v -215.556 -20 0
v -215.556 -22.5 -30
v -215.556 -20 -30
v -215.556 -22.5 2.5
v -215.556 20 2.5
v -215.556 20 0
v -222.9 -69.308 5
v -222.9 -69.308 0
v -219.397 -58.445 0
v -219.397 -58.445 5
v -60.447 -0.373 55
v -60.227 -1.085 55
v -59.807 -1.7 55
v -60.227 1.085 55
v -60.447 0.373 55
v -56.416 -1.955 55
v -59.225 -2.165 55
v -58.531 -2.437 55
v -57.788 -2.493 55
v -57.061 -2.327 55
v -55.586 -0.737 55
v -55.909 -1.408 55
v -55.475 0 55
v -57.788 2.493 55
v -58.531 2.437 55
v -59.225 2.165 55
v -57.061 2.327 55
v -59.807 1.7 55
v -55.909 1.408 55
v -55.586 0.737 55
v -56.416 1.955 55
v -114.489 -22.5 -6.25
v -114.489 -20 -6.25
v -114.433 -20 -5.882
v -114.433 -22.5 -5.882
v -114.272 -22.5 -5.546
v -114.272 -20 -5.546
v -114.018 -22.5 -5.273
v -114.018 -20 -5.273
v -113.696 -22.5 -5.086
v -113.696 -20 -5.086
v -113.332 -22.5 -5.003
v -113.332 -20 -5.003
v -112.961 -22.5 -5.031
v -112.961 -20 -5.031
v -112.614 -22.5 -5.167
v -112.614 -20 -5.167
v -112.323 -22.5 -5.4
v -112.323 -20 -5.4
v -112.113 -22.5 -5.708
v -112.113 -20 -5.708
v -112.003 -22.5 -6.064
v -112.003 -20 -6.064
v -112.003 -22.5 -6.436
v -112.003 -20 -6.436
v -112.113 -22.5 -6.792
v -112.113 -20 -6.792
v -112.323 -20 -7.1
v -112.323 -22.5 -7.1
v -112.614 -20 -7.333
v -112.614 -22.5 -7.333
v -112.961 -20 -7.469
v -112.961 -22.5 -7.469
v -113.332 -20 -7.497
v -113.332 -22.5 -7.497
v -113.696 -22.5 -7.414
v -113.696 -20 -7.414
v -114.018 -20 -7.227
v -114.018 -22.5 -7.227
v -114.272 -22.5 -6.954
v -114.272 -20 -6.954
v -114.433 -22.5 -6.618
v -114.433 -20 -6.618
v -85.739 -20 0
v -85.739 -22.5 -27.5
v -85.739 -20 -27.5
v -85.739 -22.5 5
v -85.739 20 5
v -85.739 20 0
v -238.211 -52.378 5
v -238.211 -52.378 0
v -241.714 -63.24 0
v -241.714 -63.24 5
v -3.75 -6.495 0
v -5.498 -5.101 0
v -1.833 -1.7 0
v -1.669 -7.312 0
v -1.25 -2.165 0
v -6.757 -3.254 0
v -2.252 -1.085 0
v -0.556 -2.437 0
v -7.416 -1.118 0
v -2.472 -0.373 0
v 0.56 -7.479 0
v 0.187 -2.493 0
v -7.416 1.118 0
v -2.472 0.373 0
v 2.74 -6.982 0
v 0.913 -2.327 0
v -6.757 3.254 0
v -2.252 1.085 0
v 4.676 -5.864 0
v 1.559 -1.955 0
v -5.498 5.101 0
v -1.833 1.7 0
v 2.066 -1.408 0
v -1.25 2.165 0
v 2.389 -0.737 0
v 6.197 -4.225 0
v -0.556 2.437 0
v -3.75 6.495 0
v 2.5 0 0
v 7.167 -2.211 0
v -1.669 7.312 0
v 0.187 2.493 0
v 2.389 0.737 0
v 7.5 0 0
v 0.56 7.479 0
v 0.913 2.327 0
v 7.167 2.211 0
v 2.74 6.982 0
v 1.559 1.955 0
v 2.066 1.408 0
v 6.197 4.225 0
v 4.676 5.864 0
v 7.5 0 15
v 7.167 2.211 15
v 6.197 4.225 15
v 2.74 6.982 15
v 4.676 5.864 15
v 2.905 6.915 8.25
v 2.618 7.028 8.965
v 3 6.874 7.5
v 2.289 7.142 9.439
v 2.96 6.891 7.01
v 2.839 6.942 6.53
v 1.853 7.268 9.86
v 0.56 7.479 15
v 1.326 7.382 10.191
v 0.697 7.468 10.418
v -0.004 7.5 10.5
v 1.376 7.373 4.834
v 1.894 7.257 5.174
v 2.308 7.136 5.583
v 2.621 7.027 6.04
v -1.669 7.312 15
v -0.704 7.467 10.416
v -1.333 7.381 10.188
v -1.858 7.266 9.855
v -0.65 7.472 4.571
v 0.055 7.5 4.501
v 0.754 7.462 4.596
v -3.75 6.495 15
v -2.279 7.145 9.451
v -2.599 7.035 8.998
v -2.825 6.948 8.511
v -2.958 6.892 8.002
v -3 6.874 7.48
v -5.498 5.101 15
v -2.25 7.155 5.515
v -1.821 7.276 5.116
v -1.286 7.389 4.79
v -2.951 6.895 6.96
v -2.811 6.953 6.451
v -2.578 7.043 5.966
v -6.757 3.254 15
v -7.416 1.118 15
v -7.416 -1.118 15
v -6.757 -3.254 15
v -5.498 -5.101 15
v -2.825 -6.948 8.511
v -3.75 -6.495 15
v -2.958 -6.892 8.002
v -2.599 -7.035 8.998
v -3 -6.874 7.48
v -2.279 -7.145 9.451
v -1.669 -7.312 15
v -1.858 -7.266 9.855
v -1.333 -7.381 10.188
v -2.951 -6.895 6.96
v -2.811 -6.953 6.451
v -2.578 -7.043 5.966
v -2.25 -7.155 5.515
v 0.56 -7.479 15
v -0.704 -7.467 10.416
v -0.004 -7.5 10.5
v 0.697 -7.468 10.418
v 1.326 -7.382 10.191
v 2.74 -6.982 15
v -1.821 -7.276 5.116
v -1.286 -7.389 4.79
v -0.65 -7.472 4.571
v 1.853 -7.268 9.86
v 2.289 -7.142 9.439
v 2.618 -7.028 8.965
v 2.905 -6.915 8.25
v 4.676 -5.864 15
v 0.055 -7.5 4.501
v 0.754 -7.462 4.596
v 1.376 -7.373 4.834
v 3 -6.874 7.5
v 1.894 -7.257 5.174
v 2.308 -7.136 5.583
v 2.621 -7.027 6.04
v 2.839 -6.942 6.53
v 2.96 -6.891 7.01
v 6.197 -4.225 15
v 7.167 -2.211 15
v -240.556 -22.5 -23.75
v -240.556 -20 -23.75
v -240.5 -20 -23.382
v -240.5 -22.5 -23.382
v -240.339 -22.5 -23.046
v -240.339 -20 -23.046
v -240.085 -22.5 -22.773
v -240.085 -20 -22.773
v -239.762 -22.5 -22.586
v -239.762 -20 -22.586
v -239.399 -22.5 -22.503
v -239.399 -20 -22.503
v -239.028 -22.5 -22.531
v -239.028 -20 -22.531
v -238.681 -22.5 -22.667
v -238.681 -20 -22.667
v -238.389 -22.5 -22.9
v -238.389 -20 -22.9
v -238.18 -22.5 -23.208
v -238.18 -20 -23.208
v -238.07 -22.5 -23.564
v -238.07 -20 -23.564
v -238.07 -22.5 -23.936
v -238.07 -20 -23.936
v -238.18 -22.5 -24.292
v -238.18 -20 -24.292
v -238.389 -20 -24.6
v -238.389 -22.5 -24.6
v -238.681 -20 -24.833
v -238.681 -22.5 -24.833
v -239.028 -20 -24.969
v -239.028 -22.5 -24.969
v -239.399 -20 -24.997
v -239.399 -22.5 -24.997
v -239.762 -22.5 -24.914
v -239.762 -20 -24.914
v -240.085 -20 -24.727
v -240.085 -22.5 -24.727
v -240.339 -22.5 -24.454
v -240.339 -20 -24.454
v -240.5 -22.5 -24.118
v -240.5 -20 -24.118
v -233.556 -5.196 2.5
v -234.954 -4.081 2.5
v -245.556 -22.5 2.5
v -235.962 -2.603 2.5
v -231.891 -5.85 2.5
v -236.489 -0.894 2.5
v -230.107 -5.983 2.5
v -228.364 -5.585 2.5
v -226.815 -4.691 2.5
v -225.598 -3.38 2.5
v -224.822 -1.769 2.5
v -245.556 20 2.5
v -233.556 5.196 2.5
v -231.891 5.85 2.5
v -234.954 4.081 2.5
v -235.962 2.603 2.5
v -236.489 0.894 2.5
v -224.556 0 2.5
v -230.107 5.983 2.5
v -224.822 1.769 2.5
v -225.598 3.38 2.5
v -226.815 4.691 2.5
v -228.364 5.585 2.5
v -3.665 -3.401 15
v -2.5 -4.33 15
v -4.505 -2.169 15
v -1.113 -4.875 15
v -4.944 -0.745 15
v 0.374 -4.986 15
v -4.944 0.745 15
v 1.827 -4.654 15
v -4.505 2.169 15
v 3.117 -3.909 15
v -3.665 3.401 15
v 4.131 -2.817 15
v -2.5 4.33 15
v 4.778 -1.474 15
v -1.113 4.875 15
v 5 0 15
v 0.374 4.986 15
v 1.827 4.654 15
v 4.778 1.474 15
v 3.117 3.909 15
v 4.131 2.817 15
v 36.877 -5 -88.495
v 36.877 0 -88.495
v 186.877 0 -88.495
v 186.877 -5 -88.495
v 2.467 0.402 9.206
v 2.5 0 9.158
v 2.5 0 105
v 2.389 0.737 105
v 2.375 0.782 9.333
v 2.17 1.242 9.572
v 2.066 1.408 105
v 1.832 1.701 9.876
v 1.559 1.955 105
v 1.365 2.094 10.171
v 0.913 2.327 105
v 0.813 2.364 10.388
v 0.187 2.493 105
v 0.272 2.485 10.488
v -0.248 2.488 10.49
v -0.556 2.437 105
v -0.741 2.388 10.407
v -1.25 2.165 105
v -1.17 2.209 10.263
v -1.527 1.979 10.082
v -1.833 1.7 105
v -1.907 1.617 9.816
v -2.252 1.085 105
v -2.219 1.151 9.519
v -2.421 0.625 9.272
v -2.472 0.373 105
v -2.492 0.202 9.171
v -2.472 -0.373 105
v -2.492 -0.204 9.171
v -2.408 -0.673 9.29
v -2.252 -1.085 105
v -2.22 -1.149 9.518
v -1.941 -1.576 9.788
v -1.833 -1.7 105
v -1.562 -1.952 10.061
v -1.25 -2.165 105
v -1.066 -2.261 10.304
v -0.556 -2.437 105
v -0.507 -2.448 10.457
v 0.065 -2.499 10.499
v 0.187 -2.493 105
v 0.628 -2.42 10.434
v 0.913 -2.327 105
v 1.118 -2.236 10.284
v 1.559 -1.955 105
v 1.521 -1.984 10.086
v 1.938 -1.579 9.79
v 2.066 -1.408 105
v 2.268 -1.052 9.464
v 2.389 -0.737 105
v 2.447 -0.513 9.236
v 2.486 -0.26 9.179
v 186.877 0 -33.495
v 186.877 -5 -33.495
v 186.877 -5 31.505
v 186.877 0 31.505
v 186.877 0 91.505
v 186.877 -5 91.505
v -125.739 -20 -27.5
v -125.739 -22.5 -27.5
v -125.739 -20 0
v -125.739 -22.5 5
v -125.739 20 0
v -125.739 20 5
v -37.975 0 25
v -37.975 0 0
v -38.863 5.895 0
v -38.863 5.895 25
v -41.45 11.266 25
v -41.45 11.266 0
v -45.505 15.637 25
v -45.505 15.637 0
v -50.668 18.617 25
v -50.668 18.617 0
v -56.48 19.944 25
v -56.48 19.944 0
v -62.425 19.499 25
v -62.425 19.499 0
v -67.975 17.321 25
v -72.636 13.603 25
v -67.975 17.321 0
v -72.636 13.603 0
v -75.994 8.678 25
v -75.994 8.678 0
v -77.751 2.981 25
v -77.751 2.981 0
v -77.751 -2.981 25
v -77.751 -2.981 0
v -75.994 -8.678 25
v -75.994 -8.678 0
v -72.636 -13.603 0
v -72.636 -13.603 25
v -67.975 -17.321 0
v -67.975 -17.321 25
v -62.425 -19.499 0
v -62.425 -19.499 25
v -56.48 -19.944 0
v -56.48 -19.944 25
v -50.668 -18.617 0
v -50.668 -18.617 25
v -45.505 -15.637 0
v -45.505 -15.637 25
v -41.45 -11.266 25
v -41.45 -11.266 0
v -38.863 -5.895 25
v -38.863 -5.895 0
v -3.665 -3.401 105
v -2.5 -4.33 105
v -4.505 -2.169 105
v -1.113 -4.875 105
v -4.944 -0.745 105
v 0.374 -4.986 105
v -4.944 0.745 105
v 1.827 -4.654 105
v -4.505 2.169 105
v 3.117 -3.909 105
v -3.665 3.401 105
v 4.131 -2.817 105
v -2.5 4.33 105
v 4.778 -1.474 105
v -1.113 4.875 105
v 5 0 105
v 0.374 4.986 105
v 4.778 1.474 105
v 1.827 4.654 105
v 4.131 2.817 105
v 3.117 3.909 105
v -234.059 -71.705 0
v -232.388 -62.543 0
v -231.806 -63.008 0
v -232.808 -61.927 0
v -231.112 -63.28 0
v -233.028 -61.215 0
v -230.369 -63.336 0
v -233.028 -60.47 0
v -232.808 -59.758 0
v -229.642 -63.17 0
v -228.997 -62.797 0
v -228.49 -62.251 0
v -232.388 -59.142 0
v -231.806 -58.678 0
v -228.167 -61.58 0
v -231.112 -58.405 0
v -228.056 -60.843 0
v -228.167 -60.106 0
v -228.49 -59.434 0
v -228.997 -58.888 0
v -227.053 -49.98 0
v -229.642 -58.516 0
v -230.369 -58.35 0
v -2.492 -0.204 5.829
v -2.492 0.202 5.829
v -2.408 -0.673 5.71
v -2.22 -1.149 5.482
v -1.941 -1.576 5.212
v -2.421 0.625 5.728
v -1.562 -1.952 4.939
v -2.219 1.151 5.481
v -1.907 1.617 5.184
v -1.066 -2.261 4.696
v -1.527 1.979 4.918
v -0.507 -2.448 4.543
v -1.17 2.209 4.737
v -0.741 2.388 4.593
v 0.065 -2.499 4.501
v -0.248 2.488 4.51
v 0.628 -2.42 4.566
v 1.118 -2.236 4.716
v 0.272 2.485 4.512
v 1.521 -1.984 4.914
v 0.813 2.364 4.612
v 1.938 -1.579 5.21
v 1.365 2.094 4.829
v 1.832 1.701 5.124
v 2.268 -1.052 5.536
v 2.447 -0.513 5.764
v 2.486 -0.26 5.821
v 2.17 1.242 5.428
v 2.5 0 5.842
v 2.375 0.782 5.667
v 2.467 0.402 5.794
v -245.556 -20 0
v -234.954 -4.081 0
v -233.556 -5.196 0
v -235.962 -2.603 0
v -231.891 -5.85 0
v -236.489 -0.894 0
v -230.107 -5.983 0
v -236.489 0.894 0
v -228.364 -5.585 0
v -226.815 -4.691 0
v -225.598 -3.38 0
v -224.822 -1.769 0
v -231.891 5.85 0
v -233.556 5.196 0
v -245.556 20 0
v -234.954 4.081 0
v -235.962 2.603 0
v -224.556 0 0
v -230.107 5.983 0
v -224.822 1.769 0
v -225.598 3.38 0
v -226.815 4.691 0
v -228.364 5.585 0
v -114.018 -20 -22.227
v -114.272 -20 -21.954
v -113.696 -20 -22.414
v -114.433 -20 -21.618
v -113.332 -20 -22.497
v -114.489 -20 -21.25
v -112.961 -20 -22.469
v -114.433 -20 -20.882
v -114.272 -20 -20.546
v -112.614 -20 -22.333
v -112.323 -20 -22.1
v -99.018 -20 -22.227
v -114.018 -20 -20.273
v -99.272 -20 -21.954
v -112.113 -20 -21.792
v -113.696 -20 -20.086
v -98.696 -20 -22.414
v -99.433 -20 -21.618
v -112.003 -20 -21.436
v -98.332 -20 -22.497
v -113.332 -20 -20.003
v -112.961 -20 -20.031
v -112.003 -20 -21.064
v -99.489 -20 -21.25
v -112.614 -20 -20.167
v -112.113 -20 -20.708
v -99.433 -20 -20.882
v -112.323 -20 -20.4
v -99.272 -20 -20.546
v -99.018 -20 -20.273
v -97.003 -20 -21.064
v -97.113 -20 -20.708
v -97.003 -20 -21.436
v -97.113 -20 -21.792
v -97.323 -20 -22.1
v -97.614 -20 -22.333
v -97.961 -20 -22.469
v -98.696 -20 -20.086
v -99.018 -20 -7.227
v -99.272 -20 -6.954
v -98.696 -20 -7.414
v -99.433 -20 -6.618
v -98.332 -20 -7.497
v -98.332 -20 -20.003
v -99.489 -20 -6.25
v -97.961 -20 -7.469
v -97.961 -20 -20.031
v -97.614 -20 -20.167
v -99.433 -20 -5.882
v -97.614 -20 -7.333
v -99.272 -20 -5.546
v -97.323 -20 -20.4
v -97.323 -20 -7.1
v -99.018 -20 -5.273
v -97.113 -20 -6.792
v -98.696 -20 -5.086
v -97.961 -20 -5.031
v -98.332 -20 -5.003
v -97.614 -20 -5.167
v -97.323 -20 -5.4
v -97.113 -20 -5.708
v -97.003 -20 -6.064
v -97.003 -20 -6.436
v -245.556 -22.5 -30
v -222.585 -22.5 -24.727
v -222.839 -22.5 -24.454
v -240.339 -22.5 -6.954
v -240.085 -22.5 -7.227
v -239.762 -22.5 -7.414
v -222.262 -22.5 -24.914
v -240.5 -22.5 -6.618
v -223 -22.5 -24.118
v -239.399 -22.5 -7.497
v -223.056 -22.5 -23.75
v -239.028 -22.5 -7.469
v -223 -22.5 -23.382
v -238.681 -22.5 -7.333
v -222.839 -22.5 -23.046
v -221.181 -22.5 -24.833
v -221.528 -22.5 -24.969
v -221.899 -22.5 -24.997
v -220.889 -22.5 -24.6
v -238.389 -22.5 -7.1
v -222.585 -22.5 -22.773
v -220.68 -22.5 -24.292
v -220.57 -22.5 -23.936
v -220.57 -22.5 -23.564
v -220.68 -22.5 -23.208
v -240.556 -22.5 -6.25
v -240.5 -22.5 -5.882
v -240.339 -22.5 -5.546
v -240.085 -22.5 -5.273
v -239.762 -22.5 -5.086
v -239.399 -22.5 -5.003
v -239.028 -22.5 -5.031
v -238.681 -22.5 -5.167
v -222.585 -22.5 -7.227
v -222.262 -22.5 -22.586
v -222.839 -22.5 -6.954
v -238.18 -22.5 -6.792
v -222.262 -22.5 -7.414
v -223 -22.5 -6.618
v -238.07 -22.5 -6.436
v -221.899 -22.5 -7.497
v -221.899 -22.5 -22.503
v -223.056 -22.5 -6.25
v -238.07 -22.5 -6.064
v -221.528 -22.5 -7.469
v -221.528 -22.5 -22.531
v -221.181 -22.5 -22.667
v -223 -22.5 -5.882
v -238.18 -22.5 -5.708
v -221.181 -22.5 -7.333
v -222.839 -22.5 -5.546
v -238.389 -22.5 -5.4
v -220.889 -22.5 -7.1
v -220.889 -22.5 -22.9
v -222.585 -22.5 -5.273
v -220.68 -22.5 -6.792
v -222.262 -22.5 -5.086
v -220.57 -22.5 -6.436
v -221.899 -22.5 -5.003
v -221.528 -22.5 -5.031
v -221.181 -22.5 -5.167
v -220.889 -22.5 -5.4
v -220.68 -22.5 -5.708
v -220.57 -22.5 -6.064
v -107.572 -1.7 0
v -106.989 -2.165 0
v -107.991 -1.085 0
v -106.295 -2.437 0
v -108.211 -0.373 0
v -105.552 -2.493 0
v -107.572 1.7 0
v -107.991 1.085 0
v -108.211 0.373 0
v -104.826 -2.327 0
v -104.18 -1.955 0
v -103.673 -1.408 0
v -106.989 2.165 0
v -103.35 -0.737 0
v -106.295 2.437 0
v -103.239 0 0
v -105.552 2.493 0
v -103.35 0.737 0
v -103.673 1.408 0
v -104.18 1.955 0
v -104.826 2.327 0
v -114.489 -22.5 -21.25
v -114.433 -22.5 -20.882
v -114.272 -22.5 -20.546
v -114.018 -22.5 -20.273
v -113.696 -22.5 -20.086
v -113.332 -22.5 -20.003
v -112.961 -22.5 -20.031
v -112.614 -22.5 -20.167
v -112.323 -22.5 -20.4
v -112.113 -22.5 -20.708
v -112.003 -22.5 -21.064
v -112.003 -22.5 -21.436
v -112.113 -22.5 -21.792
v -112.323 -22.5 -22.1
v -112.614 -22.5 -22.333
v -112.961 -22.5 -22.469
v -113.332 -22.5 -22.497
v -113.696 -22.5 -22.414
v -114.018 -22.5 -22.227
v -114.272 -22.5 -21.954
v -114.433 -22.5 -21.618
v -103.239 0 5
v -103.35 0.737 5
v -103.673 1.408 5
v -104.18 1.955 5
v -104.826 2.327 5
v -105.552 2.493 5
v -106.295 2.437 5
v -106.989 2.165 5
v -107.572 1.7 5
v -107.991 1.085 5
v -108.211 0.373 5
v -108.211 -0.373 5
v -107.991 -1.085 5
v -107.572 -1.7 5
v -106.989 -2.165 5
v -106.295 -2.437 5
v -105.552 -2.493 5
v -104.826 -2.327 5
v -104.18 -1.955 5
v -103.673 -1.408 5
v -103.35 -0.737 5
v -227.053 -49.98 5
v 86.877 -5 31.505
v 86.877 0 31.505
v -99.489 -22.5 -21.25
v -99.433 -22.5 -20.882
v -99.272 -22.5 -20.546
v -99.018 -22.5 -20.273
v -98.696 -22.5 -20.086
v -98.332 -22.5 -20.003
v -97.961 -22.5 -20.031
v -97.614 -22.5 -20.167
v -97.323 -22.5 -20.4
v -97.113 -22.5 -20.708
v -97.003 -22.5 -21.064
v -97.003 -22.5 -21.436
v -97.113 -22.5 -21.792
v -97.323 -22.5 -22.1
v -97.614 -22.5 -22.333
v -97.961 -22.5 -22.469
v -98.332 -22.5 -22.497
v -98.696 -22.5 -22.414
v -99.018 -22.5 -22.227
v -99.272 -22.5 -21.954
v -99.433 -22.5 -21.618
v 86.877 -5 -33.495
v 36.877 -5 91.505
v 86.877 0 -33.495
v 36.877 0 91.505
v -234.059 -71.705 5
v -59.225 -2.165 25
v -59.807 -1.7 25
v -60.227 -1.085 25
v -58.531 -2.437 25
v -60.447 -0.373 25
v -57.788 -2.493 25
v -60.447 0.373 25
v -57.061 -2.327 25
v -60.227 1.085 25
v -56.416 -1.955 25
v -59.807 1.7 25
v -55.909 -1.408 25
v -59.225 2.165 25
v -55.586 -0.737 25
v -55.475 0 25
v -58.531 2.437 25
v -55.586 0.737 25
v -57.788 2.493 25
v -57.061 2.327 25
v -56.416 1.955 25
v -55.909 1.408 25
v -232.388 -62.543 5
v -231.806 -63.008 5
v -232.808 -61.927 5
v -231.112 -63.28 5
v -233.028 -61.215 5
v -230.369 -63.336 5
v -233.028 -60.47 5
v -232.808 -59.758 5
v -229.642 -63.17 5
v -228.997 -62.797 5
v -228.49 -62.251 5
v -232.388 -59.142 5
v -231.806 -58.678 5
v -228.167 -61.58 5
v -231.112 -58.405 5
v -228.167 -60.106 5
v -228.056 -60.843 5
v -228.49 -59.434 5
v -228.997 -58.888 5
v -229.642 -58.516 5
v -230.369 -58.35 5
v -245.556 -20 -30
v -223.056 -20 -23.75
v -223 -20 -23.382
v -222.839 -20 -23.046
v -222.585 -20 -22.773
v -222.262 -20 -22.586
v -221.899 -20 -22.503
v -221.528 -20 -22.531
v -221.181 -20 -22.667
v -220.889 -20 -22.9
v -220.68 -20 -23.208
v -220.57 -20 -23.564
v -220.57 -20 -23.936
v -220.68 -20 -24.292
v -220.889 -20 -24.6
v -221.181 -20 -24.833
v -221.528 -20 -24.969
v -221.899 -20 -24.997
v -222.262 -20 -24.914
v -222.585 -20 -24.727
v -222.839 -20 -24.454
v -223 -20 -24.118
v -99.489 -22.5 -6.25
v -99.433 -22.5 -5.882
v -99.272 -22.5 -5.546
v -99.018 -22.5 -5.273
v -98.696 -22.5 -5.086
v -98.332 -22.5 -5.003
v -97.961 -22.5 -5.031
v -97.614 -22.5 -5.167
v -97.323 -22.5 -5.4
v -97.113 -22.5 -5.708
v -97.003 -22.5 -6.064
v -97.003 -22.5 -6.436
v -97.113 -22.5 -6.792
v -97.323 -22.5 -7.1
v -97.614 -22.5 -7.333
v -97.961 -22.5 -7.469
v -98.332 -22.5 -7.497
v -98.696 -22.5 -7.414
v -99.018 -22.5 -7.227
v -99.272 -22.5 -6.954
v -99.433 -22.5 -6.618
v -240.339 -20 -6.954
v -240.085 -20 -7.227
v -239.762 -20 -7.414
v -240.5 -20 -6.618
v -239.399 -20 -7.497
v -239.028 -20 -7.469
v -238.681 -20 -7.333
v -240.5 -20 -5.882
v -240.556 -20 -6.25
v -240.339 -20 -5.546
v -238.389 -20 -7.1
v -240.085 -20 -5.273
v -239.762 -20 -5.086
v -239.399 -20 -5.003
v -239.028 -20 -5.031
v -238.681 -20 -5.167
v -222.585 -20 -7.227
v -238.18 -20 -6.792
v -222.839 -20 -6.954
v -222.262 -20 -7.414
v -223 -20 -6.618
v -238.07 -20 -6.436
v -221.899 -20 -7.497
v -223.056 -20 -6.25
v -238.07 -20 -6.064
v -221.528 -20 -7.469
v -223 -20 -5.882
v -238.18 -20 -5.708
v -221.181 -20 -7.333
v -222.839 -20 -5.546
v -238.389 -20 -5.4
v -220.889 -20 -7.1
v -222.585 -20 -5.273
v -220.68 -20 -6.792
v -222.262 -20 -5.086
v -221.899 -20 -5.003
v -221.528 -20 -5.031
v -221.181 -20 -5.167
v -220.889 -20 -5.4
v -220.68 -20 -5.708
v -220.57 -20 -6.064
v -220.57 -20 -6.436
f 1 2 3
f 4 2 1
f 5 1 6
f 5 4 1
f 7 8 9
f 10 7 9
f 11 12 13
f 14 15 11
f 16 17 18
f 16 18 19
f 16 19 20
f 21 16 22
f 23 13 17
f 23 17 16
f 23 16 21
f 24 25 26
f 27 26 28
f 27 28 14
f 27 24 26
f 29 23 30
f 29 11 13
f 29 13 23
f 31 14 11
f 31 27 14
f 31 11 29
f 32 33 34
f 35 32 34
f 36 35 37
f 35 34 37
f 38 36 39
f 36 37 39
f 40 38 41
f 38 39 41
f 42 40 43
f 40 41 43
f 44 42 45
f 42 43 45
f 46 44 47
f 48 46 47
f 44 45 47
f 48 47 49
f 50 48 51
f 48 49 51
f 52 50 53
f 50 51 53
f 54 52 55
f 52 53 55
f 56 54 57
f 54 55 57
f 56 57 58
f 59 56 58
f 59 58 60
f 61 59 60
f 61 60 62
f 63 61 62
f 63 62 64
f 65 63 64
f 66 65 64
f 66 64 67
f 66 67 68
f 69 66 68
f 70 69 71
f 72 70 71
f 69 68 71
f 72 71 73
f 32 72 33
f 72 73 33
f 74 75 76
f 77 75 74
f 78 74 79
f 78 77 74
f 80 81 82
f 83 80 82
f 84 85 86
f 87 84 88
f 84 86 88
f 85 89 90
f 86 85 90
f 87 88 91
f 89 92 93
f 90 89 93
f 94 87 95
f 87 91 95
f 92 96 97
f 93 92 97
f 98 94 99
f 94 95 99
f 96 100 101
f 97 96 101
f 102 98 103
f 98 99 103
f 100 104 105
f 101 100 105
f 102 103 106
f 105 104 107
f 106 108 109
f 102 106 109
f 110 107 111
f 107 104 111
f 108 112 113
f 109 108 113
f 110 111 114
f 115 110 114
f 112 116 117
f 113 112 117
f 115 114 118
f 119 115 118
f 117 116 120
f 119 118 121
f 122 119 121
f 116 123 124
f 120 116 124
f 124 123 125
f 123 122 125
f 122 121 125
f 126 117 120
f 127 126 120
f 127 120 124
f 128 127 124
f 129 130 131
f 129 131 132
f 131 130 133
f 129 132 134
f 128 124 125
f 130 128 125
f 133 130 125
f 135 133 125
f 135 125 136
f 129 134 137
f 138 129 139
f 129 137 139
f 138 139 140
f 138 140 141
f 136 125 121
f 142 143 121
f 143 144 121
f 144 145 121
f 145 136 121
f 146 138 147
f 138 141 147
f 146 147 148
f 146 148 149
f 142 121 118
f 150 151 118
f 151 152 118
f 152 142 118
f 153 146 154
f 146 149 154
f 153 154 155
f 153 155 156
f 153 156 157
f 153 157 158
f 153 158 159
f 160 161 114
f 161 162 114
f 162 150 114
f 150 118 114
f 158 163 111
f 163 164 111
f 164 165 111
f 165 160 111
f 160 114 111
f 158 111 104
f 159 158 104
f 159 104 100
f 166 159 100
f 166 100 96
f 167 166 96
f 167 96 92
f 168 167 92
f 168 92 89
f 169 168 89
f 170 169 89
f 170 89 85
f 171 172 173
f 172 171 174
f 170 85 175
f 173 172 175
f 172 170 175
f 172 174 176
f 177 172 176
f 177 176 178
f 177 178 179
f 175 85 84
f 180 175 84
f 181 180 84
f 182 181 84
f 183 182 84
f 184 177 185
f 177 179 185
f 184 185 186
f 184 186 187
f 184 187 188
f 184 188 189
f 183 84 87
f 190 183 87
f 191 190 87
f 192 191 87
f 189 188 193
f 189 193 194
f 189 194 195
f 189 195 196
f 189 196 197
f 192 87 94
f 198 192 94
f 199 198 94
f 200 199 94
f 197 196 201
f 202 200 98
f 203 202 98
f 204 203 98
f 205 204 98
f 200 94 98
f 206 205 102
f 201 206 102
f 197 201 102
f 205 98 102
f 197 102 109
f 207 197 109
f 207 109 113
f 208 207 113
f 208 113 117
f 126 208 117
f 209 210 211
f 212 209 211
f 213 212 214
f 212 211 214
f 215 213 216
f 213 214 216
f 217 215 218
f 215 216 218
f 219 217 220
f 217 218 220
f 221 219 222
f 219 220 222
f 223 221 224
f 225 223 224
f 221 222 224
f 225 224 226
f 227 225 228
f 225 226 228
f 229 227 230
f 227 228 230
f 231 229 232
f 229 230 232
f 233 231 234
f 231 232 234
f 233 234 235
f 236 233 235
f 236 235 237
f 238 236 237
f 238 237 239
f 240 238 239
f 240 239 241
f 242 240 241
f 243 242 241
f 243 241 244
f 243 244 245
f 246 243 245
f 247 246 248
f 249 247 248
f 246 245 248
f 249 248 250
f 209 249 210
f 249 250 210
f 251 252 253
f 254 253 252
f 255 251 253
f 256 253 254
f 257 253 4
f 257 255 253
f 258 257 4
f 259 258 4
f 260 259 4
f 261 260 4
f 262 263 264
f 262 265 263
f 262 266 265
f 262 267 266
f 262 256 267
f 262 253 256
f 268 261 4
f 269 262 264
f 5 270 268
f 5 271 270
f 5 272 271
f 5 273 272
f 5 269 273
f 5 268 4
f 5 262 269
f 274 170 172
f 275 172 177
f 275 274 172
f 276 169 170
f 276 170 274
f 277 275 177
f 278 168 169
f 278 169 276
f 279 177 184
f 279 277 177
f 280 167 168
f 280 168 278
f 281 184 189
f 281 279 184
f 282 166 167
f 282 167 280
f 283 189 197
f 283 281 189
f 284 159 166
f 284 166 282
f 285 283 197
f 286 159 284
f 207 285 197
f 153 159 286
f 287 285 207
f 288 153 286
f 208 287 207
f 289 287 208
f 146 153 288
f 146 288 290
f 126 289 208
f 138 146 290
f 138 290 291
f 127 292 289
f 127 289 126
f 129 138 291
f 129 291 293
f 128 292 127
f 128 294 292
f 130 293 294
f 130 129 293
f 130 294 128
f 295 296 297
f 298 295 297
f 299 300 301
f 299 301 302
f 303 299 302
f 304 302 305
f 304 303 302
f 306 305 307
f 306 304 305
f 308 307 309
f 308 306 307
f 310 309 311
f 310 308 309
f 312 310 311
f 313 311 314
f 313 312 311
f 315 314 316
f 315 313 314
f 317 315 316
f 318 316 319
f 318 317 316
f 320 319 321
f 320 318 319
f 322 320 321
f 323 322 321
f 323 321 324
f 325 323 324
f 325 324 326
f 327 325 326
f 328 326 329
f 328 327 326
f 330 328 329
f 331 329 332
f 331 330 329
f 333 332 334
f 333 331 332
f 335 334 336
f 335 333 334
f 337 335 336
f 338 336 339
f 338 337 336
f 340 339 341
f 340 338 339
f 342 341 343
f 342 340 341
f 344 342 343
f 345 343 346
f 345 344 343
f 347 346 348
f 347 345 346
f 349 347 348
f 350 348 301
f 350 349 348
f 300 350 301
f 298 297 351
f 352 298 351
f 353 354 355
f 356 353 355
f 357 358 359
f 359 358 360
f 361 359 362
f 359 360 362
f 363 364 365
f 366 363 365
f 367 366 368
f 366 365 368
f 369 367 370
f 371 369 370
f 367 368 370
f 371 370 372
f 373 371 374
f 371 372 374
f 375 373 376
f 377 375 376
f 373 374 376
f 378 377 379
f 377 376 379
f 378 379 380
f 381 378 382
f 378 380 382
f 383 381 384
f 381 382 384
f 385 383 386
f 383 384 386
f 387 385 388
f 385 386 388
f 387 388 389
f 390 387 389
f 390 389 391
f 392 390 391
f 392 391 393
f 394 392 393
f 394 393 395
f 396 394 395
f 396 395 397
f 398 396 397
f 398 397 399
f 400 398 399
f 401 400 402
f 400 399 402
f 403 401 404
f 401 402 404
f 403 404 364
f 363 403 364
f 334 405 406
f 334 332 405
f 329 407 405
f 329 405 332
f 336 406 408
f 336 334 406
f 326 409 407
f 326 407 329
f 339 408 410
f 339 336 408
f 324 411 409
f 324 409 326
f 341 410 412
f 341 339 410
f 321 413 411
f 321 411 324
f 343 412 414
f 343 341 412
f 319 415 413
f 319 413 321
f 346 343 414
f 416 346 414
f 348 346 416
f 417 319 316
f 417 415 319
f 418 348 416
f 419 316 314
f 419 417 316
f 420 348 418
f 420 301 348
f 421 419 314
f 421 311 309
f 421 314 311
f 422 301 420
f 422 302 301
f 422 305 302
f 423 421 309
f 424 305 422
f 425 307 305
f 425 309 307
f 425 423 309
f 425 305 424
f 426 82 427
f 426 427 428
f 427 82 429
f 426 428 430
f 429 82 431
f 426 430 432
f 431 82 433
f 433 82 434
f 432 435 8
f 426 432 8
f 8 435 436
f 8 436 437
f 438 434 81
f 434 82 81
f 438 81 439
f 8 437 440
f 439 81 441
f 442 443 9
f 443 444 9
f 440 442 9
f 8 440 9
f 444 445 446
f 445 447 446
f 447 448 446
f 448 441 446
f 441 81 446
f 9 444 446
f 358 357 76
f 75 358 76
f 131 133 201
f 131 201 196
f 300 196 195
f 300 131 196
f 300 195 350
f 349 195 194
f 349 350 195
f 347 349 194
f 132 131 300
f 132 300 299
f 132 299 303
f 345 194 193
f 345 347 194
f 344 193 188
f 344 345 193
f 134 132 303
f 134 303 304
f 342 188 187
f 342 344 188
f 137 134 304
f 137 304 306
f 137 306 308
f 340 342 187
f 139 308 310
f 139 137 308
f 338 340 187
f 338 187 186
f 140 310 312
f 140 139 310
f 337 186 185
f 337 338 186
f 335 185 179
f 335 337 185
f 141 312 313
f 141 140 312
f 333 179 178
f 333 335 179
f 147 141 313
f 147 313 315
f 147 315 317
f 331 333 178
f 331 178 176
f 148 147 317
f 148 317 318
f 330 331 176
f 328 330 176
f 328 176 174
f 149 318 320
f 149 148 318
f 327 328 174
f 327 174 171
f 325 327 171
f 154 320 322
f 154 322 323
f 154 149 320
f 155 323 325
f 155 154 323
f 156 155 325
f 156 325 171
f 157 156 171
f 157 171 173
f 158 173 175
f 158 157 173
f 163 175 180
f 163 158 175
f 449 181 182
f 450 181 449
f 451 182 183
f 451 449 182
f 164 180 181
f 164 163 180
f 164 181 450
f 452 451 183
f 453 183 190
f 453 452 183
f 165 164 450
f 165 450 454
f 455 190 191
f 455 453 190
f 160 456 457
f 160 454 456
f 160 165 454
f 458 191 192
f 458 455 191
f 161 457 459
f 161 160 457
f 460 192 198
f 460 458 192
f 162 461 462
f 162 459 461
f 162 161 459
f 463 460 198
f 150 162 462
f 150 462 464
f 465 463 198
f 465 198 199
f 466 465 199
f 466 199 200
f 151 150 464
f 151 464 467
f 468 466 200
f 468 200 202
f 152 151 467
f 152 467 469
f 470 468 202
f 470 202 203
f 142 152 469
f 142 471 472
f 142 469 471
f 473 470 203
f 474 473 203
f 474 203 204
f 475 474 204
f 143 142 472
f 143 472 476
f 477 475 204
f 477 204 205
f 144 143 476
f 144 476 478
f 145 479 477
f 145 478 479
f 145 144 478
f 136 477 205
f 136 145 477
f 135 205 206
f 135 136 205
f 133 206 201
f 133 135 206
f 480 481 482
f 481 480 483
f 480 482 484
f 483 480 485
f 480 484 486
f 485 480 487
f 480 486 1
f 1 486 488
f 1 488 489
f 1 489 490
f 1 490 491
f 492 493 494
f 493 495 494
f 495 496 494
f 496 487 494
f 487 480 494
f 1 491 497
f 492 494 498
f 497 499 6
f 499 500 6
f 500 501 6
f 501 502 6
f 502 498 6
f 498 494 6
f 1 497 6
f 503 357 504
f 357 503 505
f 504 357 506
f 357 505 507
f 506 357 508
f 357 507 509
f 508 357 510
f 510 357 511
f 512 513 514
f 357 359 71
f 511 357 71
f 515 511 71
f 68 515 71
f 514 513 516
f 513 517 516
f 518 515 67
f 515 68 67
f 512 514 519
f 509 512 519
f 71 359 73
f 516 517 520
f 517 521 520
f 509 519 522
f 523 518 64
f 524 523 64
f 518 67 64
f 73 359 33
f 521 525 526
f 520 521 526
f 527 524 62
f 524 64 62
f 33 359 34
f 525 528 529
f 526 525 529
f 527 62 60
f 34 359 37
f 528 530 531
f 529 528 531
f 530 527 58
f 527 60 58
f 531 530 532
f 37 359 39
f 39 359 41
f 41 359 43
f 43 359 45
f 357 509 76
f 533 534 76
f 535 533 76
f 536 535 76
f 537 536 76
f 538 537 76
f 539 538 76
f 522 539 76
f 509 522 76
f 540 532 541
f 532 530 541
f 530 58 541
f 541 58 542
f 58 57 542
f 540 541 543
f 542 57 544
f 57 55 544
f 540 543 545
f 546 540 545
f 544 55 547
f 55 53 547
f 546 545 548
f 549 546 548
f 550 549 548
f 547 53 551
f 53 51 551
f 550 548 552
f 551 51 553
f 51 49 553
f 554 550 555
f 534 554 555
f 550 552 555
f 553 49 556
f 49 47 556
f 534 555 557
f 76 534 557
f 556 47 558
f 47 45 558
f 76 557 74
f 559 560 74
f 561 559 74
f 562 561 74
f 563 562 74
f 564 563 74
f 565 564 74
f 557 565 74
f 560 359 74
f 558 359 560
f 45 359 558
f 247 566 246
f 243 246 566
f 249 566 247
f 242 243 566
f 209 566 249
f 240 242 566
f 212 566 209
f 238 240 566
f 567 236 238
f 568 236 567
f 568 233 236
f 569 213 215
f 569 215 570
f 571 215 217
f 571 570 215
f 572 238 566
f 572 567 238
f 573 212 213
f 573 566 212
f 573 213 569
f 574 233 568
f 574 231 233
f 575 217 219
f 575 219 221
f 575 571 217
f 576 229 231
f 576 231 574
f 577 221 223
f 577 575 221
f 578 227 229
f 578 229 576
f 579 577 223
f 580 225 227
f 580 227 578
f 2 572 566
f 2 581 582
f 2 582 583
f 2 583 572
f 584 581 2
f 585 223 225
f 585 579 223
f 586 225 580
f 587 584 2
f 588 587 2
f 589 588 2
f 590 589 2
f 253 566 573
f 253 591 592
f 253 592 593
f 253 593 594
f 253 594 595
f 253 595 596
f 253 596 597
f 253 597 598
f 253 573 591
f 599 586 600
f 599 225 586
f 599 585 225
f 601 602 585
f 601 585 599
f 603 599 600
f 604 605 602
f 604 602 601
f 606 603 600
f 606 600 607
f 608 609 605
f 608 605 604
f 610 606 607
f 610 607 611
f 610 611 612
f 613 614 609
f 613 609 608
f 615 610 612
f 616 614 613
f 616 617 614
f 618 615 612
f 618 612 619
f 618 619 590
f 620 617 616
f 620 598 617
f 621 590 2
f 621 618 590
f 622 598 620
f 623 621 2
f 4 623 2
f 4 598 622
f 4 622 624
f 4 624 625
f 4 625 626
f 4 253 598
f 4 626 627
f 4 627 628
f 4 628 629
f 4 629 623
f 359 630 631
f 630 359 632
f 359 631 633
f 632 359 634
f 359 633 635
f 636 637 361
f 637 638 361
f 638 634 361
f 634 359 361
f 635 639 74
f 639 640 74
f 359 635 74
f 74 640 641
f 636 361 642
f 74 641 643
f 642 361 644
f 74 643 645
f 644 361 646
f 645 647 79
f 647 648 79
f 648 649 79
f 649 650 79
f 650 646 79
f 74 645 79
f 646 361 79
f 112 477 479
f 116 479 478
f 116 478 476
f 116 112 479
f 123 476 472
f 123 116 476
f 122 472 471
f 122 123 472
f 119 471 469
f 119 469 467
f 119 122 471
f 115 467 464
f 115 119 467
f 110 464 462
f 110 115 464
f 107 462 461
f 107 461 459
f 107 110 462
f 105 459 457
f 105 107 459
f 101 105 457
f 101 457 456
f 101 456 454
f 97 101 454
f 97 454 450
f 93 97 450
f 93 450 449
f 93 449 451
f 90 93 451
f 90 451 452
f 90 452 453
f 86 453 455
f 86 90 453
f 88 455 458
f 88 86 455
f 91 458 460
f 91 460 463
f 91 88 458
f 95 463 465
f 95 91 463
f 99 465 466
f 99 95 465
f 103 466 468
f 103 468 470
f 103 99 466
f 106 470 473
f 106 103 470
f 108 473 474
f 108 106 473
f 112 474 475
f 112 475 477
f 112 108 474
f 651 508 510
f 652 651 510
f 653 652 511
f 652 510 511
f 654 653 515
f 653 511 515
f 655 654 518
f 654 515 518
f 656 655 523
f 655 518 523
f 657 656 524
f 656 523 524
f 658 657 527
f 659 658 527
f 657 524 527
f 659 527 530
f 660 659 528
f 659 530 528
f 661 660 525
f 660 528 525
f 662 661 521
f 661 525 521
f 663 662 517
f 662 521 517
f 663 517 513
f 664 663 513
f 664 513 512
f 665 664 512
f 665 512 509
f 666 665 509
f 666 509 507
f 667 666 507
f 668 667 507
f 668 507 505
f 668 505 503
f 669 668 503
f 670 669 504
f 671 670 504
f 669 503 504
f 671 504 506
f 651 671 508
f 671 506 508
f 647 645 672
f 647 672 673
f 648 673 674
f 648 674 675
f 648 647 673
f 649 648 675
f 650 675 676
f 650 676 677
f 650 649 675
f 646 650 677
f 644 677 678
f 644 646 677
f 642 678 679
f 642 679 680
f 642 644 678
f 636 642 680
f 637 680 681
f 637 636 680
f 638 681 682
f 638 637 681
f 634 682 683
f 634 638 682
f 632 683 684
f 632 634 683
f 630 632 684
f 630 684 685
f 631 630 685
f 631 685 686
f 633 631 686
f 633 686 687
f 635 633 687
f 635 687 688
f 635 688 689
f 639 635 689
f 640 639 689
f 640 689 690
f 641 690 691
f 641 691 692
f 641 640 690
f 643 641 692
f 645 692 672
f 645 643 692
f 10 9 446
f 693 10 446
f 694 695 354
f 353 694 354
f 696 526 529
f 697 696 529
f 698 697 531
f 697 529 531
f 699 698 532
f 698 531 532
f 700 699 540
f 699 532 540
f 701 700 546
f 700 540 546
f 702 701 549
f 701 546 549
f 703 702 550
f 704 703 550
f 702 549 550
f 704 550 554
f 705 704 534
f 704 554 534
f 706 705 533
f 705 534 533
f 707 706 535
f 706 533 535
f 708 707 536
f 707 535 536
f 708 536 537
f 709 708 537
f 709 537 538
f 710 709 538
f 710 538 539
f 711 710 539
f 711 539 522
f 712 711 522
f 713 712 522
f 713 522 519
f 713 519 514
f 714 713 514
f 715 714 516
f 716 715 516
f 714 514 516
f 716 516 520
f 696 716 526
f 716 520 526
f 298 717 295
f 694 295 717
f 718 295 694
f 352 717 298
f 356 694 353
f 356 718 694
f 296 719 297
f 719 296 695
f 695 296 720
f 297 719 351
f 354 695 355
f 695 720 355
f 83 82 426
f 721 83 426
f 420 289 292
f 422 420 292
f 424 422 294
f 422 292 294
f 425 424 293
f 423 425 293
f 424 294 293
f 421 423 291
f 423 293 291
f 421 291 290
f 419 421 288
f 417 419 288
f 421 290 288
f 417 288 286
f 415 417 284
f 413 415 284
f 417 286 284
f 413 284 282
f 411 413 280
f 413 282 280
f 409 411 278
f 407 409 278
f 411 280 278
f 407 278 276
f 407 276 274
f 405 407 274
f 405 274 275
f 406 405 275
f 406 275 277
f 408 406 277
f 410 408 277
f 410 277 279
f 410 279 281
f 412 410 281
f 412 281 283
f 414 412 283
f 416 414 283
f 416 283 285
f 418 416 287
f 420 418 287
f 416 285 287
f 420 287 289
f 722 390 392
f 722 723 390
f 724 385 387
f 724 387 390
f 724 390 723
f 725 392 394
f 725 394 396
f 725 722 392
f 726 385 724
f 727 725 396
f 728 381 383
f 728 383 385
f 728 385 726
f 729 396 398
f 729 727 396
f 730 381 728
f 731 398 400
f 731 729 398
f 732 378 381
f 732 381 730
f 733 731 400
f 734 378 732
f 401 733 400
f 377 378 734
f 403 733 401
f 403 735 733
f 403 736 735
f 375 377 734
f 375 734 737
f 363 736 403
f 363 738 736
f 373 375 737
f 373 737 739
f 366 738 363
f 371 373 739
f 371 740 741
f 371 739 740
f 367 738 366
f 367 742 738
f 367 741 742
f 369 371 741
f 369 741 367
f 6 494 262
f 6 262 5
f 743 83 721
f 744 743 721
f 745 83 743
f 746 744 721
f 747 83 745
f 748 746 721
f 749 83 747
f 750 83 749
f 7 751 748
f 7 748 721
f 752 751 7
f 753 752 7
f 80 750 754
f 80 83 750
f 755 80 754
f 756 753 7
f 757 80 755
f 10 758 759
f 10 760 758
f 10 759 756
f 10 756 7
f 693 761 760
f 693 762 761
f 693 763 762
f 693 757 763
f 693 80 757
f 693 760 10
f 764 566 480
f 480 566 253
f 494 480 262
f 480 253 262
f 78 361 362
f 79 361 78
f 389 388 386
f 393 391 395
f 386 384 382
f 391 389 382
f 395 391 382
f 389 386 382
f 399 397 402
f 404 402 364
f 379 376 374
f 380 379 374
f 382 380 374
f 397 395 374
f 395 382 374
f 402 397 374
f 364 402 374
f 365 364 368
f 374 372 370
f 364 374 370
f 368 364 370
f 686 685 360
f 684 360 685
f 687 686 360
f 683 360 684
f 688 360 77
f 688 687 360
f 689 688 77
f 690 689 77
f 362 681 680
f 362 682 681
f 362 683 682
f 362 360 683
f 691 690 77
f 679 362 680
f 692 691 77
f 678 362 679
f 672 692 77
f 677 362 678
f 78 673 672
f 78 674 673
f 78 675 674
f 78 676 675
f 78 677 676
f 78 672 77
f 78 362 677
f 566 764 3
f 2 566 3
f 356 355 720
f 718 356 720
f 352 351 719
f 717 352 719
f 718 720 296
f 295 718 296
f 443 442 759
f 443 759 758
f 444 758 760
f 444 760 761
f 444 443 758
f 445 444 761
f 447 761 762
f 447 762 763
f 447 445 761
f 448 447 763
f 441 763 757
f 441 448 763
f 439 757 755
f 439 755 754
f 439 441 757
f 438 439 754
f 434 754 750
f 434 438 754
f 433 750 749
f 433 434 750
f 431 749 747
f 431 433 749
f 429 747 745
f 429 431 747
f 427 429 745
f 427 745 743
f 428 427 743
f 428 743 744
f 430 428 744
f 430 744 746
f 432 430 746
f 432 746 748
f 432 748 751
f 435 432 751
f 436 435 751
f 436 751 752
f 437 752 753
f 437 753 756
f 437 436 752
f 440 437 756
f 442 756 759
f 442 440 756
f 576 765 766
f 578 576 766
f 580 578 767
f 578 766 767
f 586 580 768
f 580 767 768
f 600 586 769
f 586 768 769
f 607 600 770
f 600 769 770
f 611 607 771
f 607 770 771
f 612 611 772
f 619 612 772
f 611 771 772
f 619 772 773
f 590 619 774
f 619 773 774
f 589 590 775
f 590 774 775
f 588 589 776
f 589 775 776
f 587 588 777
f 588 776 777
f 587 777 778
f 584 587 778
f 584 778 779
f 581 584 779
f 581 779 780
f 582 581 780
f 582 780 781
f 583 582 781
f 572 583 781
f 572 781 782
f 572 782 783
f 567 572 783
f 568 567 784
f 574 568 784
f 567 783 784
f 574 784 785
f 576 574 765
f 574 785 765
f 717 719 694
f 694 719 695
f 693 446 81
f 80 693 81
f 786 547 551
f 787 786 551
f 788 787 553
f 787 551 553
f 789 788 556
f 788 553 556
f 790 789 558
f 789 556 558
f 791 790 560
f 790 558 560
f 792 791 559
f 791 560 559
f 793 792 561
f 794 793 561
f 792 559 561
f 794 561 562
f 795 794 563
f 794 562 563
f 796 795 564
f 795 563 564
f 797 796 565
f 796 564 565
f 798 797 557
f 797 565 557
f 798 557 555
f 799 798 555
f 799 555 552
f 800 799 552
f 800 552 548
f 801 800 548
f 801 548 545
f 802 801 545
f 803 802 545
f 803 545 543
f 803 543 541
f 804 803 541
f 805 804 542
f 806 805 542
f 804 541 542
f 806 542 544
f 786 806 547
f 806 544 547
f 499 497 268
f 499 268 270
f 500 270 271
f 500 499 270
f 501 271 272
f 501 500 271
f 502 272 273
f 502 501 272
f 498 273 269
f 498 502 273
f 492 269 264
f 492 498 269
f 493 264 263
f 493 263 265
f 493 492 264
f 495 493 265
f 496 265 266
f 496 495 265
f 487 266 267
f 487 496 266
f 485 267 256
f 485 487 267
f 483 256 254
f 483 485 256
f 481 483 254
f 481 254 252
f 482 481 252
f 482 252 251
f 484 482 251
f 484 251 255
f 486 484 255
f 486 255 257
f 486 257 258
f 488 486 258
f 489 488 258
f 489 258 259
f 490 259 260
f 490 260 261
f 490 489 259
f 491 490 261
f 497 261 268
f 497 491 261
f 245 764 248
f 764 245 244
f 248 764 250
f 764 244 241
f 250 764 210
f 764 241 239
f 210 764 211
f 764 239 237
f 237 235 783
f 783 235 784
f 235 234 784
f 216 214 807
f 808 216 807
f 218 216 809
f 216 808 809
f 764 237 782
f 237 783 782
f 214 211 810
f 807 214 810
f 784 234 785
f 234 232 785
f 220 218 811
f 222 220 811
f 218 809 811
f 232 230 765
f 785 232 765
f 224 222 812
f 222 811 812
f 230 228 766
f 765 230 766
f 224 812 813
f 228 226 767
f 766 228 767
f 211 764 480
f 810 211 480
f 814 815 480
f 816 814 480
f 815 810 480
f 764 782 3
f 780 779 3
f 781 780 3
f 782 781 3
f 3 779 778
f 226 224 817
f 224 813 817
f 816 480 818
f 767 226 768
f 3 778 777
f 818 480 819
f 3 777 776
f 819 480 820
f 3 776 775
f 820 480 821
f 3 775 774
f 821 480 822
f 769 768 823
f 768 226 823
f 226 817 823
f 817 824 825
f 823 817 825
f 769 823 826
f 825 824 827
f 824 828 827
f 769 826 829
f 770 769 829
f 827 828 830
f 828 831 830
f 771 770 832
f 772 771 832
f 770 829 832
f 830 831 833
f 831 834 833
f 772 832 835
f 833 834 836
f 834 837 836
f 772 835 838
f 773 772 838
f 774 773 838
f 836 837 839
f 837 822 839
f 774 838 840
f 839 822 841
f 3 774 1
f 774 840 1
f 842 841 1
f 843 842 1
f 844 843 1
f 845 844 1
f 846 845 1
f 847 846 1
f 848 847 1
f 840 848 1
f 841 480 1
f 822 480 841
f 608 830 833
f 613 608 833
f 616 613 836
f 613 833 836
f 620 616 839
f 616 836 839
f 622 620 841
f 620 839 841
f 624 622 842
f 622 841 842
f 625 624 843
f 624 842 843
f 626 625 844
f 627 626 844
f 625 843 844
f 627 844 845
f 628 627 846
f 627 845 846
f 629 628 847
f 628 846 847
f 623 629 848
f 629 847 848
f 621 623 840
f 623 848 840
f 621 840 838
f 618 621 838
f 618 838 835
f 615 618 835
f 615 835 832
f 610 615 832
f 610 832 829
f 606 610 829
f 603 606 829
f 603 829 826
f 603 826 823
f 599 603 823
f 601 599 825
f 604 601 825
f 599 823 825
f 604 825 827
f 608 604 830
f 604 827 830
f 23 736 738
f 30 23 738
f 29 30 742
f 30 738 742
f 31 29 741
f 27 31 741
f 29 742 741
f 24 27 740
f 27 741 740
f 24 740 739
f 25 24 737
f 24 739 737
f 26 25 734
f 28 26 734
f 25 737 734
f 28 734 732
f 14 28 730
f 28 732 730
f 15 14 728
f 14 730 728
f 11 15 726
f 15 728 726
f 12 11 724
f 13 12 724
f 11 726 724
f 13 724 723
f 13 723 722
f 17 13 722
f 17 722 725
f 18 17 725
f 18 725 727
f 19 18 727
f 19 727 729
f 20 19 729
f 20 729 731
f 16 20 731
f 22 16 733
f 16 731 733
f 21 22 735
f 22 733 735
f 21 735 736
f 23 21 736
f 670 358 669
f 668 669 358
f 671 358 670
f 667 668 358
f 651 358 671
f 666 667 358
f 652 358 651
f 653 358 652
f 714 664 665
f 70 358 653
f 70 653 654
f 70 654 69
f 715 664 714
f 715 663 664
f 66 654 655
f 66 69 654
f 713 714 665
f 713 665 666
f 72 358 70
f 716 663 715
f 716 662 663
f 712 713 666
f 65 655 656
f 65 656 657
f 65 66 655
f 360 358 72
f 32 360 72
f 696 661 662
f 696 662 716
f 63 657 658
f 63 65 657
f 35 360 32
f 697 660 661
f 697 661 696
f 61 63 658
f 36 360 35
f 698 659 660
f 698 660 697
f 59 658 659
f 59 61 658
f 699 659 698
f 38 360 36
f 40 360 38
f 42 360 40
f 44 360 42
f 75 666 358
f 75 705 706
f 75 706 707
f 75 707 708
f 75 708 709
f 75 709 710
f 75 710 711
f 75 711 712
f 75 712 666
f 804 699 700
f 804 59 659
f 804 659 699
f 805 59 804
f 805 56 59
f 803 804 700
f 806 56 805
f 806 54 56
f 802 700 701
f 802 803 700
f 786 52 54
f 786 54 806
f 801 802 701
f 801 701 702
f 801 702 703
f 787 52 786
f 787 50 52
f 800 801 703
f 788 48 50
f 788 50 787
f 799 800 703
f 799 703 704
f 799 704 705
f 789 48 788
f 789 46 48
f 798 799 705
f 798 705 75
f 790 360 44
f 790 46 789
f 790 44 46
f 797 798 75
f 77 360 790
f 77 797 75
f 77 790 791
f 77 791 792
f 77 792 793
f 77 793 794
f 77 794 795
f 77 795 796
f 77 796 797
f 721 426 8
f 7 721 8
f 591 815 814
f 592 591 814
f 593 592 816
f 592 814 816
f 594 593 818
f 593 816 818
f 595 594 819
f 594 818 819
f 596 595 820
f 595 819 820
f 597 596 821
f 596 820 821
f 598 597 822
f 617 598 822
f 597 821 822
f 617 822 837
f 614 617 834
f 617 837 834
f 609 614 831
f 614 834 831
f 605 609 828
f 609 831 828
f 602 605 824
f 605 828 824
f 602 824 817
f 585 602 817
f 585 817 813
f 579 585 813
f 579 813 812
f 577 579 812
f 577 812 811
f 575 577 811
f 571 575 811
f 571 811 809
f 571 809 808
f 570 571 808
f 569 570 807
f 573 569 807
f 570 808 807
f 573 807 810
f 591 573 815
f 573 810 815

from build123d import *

# Parameters (mm, degrees)
F0_R      = 2.5
F1_DEPTH  = 15
F2_R      = 5
F2_R_2    = 2.5
F3_DEPTH  = 90
F5_R      = 3
F6_DEPTH  = 15.001
F0_R_2    = 20
F7_DEPTH  = 25
F8_R      = 2.5
F9_DEPTH  = 30
F0_W      = 40
F0_H      = 40
F10_DEPTH = 5
F11_W     = 40
F11_H     = 2.5
F12_DEPTH = 32.5
F14_DEPTH = 5
F0_W_2    = 30
F0_R_3    = 6
F16_DEPTH = 2.5
F17_W     = 30
F17_H     = 2.5
F18_DEPTH = 32.5
F19_DEPTH = 5
F20_R     = 1.25
F21_DEPTH = 2.5
F22_R     = 1.25
F23_DEPTH = 2.5


with BuildPart() as f1:
    # F0 (on Top) → F1 (new body)
    with BuildSketch(Plane.XY):
        with BuildLine():
            ThreePointArc((0, 7.5), (-5.3033008589, -5.3033008589), (7.5, 0))
            ThreePointArc((7.5, 0), (5.3033008589, 5.3033008589), (0, 7.5))
        make_face()
        Circle(F0_R, mode=Mode.SUBTRACT)
    extrude(amount=F1_DEPTH)

    # F2 (on face) → F3 (join)
    with BuildSketch(Plane.XY.offset(15)):
        Circle(F2_R)
        Circle(F2_R_2, mode=Mode.SUBTRACT)
    extrude(amount=F3_DEPTH)

    # F5 (on face) → F6 (cut, through all)
    with BuildSketch(Plane.XZ.offset(-7.5)):
        with Locations((0, 7.5)):
            Circle(F5_R)
    extrude(amount=F6_DEPTH, mode=Mode.SUBTRACT)


with BuildPart() as f7:
    # F0 (on Top) → F7 (new body)
    with BuildSketch(Plane.XY):
        with Locations((-57.9745993018, 0)):
            Circle(F0_R_2)
    extrude(amount=F7_DEPTH)

    # F8 (on face) → F9 (join)
    with BuildSketch(Plane.XY.offset(25)):
        with Locations((-57.9745993018, 0)):
            Circle(F8_R)
    extrude(amount=F9_DEPTH)


with BuildPart() as f10:
    # F0 (on Top) → F10 (new body)
    with BuildSketch(Plane.XY):
        with Locations((-105.7388707995, 0)):
            Rectangle(F0_W, F0_H)
        with Locations((-105.7388707995, 0)):
            Circle(F0_R, mode=Mode.SUBTRACT)
    extrude(amount=F10_DEPTH)

    # F11 (on face) → F12 (join)
    with BuildSketch(Plane.XY.offset(5)):
        with Locations((-105.7388707995, -21.25)):
            Rectangle(F11_W, F11_H)
    extrude(amount=-F12_DEPTH)

    # F20 (on face) → F21 (cut, through all)
    with BuildSketch(Plane(origin=(0, -20, 0), x_dir=(-1, 0, 0), z_dir=(0, 1, 0))):
        with Locations((98.2388707995, -6.25)):
            Circle(F20_R)
        with Locations((113.2388707995, -6.25)):
            Circle(F20_R)
        with Locations((113.2388707995, -21.25)):
            Circle(F20_R)
        with Locations((98.2388707995, -21.25)):
            Circle(F20_R)
    extrude(amount=-F21_DEPTH, mode=Mode.SUBTRACT)


with BuildPart() as f14:
    # F13 (on Front) → F14 (new body)
    with BuildSketch(Plane.XZ):
        Polygon((186.8768878281, 91.5050628316), (36.8768878281, 91.5050628316), (36.8768878281, -88.4949371684), (186.8768878281, -88.4949371684), (186.8768878281, -33.4949371684), (86.8768878281, -33.4949371684), (86.8768878281, 31.5050628316), (186.8768878281, 31.5050628316), align=None)
    extrude(amount=F14_DEPTH)


with BuildPart() as f16:
    # F0 (on Top) → F16 (new body)
    with BuildSketch(Plane.XY):
        with Locations((-230.5557584763, 0)):
            Rectangle(F0_W_2, F0_H)
        with Locations((-230.5557584763, 0)):
            Circle(F0_R_3, mode=Mode.SUBTRACT)
    extrude(amount=F16_DEPTH)

    # F17 (on face) → F18 (join)
    with BuildSketch(Plane.XY.offset(2.5)):
        with Locations((-230.5557584763, -21.25)):
            Rectangle(F17_W, F17_H)
    extrude(amount=-F18_DEPTH)

    # F22 (on face) → F23 (cut, through all)
    with BuildSketch(Plane(origin=(0, -20, 0), x_dir=(-1, 0, 0), z_dir=(0, 1, 0))):
        with Locations((221.8057584763, -6.25)):
            Circle(F22_R)
        with Locations((221.8057584763, -23.75)):
            Circle(F22_R)
        with Locations((239.3057584763, -23.75)):
            Circle(F22_R)
        with Locations((239.3057584763, -6.25)):
            Circle(F22_R)
    extrude(amount=-F23_DEPTH, mode=Mode.SUBTRACT)


with BuildPart() as f19:
    # F0 (on Top) → F19 (new body)
    with BuildSketch(Plane.XY):
        Polygon((-222.9001823011, -69.3075905842), (-219.3971571383, -58.4452201324), (-227.0527333135, -49.9803261255), (-238.2113346515, -52.3778025704), (-241.7143598142, -63.2401730222), (-234.058783639, -71.7050670291), align=None)
        with Locations((-230.5557584763, -60.8426965773)):
            Circle(F0_R, mode=Mode.SUBTRACT)
    extrude(amount=F19_DEPTH)


solid = Compound([f1.part, f7.part, f10.part, f14.part, f16.part, f19.part])
